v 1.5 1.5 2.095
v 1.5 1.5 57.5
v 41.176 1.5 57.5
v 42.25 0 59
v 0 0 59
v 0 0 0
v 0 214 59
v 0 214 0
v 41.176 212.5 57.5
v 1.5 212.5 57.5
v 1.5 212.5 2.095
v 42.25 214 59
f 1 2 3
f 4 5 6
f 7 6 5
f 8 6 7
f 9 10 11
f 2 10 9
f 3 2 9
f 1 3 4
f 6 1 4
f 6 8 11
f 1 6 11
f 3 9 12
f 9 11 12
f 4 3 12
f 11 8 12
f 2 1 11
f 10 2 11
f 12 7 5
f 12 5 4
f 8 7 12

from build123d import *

# Parameters (mm, degrees)
F0_W     = 42.25
F0_H     = 214
F1_DEPTH = 59
F3_DEPTH = 214
F4_T     = -1.5


with BuildPart() as f1:
    # F0 (on Top) → F1 (new body)
    with BuildSketch(Plane.XY):
        with Locations((21.125, 107)):
            Rectangle(F0_W, F0_H)
    extrude(amount=F1_DEPTH)

    # F2 (on face) → F3 (cut, through all)
    with BuildSketch(Plane(origin=(0, 214, 0), x_dir=(-1, 0, 0), z_dir=(0, 1, 0))):
        Polygon((0, 0), (-42.25, 59), (-42.25, 0), align=None)
    extrude(amount=-F3_DEPTH, mode=Mode.SUBTRACT)

    # F4
    f4_openings = [f1.faces().sort_by_distance(p)[0] for p in [
        (21.125, 107, 29.5),
    ]]
    offset(amount=F4_T, openings=f4_openings)


solid = f1.part
